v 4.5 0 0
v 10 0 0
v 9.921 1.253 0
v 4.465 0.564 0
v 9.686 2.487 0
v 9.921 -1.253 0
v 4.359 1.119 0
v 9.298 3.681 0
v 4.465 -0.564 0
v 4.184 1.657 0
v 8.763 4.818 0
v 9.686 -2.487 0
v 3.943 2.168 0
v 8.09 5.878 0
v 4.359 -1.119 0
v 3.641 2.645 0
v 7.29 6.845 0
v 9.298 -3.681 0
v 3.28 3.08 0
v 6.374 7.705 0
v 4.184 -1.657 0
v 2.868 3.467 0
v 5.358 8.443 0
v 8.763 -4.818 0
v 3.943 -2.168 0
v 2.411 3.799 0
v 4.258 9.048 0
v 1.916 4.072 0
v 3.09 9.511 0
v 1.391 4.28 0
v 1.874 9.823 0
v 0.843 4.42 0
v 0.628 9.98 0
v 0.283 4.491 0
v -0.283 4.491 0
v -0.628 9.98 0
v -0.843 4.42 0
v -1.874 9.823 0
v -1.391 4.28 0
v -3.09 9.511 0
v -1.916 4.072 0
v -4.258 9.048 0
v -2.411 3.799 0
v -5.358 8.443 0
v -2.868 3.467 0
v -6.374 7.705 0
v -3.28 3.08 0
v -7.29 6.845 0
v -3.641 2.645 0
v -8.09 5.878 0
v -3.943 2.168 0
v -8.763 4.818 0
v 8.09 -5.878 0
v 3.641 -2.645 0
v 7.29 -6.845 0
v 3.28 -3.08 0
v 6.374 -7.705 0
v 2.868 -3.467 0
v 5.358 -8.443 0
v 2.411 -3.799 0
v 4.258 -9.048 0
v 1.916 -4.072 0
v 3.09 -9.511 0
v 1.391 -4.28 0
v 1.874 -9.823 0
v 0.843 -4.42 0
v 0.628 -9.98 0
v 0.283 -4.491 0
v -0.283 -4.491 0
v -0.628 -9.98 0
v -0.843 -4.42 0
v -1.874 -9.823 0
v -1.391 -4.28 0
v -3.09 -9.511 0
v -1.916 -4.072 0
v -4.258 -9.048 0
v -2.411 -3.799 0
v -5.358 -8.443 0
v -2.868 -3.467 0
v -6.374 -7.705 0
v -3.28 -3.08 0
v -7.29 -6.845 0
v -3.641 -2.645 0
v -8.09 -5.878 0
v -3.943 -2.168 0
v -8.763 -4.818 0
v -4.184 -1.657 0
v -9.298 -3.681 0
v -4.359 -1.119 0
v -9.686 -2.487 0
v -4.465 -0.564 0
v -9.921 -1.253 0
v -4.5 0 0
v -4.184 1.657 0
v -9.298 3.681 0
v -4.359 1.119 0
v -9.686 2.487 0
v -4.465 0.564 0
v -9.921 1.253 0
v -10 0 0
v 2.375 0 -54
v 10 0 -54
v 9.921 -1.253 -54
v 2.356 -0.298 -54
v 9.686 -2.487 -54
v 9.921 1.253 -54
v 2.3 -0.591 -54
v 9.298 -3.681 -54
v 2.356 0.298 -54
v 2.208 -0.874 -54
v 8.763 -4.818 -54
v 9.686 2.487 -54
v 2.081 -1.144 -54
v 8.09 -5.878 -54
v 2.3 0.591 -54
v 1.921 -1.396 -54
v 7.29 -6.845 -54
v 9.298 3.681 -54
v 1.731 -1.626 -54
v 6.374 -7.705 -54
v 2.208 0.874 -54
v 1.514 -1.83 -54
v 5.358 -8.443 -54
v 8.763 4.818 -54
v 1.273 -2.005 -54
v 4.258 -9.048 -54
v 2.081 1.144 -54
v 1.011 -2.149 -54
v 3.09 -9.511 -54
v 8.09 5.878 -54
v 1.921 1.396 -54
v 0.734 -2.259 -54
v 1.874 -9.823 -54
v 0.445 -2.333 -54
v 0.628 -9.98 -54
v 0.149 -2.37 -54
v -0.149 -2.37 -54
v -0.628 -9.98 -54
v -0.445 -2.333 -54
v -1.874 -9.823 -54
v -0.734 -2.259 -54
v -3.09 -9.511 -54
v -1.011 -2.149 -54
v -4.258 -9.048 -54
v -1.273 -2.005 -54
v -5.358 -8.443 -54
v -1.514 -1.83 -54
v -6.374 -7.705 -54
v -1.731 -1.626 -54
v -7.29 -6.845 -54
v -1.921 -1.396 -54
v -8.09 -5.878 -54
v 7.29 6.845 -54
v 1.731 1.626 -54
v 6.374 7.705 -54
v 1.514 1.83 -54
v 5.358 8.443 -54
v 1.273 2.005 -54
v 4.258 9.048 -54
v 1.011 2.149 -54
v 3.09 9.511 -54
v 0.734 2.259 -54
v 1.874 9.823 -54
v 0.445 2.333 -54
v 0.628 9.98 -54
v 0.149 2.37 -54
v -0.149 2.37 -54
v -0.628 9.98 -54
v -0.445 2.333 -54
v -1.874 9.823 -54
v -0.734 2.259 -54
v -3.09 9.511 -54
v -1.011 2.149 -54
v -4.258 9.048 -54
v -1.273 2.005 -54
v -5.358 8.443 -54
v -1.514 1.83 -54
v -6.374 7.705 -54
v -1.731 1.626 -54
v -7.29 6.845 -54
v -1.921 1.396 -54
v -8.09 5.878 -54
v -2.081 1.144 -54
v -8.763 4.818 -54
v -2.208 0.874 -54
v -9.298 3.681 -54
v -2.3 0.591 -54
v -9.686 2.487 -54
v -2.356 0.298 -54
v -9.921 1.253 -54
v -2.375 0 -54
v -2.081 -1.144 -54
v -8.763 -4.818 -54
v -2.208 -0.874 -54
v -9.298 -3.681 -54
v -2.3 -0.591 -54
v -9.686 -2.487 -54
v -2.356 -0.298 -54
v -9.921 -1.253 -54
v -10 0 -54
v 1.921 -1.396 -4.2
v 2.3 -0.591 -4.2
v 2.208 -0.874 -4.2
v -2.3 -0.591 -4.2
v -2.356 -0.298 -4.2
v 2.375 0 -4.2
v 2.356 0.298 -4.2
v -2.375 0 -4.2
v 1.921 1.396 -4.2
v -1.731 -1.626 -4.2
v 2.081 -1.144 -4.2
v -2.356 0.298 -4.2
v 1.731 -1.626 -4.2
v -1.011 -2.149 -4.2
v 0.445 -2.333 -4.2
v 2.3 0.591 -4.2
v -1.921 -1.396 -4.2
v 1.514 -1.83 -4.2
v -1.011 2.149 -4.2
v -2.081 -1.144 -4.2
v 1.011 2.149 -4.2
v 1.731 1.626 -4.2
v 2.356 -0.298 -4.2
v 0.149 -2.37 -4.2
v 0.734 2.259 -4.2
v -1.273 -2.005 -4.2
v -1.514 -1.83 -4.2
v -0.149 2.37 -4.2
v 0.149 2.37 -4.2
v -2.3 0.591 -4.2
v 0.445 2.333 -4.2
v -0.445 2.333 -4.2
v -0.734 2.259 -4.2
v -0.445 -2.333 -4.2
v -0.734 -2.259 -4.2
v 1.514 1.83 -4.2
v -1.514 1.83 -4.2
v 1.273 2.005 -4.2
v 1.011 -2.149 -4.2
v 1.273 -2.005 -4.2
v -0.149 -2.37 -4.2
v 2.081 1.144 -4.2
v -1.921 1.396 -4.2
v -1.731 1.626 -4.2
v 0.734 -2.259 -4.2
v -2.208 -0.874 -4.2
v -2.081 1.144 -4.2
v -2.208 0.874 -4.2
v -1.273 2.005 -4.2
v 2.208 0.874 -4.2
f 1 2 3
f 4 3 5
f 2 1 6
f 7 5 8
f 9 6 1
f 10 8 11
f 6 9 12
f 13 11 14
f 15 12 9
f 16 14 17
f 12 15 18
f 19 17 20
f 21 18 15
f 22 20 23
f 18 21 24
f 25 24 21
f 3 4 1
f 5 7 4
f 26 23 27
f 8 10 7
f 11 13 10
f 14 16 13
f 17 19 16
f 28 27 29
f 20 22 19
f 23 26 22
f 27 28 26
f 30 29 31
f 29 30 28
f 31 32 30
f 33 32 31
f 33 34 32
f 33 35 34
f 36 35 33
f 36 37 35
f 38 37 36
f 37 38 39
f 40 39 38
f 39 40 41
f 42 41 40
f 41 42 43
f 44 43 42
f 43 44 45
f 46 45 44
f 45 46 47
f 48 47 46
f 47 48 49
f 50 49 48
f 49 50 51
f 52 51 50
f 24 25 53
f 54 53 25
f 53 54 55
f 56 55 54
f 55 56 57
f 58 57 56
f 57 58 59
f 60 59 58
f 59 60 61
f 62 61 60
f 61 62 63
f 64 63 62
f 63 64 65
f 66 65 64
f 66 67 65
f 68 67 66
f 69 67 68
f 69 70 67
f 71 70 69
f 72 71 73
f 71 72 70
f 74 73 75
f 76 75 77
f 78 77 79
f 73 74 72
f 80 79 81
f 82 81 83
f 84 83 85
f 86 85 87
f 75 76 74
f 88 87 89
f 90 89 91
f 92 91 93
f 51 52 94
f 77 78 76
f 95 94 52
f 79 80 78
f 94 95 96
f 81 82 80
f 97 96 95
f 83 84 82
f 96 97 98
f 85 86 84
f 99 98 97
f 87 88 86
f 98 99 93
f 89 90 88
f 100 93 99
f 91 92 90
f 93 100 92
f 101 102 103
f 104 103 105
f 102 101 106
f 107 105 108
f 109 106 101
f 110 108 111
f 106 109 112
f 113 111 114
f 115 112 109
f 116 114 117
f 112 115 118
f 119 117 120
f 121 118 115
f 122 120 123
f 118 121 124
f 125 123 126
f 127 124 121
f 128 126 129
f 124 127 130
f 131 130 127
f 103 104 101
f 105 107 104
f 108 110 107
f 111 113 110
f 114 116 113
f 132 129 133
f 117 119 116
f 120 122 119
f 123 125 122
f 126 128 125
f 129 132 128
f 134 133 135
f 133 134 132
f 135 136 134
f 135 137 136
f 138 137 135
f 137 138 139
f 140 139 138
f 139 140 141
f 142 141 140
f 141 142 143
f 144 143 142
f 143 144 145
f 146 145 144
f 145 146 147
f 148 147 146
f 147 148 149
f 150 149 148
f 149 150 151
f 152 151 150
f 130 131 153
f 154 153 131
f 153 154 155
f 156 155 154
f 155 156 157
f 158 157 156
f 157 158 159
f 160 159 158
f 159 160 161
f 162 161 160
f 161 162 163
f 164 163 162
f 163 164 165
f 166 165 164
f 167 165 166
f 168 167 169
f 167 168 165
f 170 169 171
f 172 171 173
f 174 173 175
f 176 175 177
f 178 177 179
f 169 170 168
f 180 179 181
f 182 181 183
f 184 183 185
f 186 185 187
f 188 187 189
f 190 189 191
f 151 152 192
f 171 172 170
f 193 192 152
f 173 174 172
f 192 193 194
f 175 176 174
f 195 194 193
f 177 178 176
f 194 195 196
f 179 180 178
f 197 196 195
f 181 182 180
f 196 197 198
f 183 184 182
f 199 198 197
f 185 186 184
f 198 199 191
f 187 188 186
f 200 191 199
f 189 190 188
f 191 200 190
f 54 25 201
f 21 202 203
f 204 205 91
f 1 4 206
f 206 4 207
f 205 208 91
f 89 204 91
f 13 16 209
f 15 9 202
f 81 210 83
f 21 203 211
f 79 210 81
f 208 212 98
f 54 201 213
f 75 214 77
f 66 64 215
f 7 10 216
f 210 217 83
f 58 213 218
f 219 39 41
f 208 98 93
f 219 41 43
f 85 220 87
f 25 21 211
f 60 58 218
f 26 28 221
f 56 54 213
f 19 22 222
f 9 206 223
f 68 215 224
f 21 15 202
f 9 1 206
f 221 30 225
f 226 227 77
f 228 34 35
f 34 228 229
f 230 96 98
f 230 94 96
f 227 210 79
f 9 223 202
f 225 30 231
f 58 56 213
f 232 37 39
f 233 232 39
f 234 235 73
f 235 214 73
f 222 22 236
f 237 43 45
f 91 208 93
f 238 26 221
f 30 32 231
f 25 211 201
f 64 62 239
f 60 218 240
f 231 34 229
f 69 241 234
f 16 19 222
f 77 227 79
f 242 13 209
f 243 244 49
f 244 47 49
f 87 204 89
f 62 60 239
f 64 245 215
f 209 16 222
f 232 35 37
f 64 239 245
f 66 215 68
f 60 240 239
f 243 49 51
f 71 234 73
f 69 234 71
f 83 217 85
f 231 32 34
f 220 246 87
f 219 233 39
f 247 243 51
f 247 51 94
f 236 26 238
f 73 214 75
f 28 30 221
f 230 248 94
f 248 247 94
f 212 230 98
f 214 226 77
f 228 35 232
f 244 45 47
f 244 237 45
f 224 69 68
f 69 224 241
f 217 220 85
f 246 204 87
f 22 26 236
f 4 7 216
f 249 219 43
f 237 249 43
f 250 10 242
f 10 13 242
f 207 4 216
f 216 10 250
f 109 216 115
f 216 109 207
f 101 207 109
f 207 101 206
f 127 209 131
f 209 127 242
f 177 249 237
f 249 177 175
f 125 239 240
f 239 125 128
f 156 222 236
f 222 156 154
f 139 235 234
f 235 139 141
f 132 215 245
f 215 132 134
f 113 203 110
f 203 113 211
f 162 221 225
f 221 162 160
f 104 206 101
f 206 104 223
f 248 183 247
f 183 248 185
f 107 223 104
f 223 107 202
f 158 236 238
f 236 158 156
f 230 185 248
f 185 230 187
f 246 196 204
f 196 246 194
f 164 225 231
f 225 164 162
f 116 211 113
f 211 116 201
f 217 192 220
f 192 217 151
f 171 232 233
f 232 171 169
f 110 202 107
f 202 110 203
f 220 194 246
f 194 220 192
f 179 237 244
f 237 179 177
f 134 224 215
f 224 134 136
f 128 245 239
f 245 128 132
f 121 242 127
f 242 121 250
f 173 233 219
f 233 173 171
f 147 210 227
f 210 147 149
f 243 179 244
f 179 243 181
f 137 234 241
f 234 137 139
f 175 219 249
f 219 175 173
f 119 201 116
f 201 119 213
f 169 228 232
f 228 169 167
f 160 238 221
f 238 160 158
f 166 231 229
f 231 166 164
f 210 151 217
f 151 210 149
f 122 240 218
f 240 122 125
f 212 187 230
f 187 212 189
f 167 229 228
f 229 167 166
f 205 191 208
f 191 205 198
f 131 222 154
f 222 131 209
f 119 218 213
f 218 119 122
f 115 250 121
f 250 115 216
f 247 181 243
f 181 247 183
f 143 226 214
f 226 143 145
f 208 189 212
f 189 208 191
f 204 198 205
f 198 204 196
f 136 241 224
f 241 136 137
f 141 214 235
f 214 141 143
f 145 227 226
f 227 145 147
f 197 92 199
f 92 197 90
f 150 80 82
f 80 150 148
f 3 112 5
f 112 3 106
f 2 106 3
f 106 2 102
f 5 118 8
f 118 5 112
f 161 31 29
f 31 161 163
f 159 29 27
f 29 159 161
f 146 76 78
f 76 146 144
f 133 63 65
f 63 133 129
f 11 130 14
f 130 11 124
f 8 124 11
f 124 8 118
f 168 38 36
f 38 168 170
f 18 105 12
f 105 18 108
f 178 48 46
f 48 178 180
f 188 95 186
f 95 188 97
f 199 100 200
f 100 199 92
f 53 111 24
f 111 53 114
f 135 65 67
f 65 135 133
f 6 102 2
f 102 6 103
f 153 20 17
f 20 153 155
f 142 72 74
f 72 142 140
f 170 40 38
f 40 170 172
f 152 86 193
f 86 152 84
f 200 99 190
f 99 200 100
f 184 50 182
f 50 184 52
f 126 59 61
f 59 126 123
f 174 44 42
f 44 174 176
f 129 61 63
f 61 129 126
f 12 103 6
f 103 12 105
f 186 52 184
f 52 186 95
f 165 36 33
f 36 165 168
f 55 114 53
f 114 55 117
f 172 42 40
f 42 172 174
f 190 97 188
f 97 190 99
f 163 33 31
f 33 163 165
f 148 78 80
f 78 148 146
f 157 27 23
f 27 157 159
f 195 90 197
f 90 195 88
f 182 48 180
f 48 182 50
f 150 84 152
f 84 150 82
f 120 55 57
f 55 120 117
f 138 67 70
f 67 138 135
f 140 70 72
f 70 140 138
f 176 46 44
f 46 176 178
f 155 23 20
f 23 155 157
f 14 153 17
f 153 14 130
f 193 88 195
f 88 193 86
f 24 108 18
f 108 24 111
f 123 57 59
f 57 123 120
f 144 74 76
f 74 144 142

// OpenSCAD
$fn = 50;


difference() {
	union() {
		translate(v = [0, 0, -54.0000000000]) {
			cylinder(h = 54, r = 10.0000000000);
		}
	}
	union() {
		translate(v = [0, 0, 0]) {
			rotate(a = [0, 0, 0]) {
				difference() {
					union() {
						#translate(v = [0, 0, -54.0000000000]) {
							cylinder(h = 54, r = 2.2500000000);
						}
						#translate(v = [0, 0, -4.2000000000]) {
							cylinder(h = 4.2000000000, r = 10.0000000000, r1 = 2.3750000000, r2 = 4.5000000000);
						}
						#translate(v = [0, 0, -54.0000000000]) {
							cylinder(h = 54, r = 2.3750000000);
						}
						#translate(v = [0, 0, -54.0000000000]) {
							cylinder(h = 54, r = 2.2500000000);
						}
					}
					union();
				}
			}
		}
	}
}
